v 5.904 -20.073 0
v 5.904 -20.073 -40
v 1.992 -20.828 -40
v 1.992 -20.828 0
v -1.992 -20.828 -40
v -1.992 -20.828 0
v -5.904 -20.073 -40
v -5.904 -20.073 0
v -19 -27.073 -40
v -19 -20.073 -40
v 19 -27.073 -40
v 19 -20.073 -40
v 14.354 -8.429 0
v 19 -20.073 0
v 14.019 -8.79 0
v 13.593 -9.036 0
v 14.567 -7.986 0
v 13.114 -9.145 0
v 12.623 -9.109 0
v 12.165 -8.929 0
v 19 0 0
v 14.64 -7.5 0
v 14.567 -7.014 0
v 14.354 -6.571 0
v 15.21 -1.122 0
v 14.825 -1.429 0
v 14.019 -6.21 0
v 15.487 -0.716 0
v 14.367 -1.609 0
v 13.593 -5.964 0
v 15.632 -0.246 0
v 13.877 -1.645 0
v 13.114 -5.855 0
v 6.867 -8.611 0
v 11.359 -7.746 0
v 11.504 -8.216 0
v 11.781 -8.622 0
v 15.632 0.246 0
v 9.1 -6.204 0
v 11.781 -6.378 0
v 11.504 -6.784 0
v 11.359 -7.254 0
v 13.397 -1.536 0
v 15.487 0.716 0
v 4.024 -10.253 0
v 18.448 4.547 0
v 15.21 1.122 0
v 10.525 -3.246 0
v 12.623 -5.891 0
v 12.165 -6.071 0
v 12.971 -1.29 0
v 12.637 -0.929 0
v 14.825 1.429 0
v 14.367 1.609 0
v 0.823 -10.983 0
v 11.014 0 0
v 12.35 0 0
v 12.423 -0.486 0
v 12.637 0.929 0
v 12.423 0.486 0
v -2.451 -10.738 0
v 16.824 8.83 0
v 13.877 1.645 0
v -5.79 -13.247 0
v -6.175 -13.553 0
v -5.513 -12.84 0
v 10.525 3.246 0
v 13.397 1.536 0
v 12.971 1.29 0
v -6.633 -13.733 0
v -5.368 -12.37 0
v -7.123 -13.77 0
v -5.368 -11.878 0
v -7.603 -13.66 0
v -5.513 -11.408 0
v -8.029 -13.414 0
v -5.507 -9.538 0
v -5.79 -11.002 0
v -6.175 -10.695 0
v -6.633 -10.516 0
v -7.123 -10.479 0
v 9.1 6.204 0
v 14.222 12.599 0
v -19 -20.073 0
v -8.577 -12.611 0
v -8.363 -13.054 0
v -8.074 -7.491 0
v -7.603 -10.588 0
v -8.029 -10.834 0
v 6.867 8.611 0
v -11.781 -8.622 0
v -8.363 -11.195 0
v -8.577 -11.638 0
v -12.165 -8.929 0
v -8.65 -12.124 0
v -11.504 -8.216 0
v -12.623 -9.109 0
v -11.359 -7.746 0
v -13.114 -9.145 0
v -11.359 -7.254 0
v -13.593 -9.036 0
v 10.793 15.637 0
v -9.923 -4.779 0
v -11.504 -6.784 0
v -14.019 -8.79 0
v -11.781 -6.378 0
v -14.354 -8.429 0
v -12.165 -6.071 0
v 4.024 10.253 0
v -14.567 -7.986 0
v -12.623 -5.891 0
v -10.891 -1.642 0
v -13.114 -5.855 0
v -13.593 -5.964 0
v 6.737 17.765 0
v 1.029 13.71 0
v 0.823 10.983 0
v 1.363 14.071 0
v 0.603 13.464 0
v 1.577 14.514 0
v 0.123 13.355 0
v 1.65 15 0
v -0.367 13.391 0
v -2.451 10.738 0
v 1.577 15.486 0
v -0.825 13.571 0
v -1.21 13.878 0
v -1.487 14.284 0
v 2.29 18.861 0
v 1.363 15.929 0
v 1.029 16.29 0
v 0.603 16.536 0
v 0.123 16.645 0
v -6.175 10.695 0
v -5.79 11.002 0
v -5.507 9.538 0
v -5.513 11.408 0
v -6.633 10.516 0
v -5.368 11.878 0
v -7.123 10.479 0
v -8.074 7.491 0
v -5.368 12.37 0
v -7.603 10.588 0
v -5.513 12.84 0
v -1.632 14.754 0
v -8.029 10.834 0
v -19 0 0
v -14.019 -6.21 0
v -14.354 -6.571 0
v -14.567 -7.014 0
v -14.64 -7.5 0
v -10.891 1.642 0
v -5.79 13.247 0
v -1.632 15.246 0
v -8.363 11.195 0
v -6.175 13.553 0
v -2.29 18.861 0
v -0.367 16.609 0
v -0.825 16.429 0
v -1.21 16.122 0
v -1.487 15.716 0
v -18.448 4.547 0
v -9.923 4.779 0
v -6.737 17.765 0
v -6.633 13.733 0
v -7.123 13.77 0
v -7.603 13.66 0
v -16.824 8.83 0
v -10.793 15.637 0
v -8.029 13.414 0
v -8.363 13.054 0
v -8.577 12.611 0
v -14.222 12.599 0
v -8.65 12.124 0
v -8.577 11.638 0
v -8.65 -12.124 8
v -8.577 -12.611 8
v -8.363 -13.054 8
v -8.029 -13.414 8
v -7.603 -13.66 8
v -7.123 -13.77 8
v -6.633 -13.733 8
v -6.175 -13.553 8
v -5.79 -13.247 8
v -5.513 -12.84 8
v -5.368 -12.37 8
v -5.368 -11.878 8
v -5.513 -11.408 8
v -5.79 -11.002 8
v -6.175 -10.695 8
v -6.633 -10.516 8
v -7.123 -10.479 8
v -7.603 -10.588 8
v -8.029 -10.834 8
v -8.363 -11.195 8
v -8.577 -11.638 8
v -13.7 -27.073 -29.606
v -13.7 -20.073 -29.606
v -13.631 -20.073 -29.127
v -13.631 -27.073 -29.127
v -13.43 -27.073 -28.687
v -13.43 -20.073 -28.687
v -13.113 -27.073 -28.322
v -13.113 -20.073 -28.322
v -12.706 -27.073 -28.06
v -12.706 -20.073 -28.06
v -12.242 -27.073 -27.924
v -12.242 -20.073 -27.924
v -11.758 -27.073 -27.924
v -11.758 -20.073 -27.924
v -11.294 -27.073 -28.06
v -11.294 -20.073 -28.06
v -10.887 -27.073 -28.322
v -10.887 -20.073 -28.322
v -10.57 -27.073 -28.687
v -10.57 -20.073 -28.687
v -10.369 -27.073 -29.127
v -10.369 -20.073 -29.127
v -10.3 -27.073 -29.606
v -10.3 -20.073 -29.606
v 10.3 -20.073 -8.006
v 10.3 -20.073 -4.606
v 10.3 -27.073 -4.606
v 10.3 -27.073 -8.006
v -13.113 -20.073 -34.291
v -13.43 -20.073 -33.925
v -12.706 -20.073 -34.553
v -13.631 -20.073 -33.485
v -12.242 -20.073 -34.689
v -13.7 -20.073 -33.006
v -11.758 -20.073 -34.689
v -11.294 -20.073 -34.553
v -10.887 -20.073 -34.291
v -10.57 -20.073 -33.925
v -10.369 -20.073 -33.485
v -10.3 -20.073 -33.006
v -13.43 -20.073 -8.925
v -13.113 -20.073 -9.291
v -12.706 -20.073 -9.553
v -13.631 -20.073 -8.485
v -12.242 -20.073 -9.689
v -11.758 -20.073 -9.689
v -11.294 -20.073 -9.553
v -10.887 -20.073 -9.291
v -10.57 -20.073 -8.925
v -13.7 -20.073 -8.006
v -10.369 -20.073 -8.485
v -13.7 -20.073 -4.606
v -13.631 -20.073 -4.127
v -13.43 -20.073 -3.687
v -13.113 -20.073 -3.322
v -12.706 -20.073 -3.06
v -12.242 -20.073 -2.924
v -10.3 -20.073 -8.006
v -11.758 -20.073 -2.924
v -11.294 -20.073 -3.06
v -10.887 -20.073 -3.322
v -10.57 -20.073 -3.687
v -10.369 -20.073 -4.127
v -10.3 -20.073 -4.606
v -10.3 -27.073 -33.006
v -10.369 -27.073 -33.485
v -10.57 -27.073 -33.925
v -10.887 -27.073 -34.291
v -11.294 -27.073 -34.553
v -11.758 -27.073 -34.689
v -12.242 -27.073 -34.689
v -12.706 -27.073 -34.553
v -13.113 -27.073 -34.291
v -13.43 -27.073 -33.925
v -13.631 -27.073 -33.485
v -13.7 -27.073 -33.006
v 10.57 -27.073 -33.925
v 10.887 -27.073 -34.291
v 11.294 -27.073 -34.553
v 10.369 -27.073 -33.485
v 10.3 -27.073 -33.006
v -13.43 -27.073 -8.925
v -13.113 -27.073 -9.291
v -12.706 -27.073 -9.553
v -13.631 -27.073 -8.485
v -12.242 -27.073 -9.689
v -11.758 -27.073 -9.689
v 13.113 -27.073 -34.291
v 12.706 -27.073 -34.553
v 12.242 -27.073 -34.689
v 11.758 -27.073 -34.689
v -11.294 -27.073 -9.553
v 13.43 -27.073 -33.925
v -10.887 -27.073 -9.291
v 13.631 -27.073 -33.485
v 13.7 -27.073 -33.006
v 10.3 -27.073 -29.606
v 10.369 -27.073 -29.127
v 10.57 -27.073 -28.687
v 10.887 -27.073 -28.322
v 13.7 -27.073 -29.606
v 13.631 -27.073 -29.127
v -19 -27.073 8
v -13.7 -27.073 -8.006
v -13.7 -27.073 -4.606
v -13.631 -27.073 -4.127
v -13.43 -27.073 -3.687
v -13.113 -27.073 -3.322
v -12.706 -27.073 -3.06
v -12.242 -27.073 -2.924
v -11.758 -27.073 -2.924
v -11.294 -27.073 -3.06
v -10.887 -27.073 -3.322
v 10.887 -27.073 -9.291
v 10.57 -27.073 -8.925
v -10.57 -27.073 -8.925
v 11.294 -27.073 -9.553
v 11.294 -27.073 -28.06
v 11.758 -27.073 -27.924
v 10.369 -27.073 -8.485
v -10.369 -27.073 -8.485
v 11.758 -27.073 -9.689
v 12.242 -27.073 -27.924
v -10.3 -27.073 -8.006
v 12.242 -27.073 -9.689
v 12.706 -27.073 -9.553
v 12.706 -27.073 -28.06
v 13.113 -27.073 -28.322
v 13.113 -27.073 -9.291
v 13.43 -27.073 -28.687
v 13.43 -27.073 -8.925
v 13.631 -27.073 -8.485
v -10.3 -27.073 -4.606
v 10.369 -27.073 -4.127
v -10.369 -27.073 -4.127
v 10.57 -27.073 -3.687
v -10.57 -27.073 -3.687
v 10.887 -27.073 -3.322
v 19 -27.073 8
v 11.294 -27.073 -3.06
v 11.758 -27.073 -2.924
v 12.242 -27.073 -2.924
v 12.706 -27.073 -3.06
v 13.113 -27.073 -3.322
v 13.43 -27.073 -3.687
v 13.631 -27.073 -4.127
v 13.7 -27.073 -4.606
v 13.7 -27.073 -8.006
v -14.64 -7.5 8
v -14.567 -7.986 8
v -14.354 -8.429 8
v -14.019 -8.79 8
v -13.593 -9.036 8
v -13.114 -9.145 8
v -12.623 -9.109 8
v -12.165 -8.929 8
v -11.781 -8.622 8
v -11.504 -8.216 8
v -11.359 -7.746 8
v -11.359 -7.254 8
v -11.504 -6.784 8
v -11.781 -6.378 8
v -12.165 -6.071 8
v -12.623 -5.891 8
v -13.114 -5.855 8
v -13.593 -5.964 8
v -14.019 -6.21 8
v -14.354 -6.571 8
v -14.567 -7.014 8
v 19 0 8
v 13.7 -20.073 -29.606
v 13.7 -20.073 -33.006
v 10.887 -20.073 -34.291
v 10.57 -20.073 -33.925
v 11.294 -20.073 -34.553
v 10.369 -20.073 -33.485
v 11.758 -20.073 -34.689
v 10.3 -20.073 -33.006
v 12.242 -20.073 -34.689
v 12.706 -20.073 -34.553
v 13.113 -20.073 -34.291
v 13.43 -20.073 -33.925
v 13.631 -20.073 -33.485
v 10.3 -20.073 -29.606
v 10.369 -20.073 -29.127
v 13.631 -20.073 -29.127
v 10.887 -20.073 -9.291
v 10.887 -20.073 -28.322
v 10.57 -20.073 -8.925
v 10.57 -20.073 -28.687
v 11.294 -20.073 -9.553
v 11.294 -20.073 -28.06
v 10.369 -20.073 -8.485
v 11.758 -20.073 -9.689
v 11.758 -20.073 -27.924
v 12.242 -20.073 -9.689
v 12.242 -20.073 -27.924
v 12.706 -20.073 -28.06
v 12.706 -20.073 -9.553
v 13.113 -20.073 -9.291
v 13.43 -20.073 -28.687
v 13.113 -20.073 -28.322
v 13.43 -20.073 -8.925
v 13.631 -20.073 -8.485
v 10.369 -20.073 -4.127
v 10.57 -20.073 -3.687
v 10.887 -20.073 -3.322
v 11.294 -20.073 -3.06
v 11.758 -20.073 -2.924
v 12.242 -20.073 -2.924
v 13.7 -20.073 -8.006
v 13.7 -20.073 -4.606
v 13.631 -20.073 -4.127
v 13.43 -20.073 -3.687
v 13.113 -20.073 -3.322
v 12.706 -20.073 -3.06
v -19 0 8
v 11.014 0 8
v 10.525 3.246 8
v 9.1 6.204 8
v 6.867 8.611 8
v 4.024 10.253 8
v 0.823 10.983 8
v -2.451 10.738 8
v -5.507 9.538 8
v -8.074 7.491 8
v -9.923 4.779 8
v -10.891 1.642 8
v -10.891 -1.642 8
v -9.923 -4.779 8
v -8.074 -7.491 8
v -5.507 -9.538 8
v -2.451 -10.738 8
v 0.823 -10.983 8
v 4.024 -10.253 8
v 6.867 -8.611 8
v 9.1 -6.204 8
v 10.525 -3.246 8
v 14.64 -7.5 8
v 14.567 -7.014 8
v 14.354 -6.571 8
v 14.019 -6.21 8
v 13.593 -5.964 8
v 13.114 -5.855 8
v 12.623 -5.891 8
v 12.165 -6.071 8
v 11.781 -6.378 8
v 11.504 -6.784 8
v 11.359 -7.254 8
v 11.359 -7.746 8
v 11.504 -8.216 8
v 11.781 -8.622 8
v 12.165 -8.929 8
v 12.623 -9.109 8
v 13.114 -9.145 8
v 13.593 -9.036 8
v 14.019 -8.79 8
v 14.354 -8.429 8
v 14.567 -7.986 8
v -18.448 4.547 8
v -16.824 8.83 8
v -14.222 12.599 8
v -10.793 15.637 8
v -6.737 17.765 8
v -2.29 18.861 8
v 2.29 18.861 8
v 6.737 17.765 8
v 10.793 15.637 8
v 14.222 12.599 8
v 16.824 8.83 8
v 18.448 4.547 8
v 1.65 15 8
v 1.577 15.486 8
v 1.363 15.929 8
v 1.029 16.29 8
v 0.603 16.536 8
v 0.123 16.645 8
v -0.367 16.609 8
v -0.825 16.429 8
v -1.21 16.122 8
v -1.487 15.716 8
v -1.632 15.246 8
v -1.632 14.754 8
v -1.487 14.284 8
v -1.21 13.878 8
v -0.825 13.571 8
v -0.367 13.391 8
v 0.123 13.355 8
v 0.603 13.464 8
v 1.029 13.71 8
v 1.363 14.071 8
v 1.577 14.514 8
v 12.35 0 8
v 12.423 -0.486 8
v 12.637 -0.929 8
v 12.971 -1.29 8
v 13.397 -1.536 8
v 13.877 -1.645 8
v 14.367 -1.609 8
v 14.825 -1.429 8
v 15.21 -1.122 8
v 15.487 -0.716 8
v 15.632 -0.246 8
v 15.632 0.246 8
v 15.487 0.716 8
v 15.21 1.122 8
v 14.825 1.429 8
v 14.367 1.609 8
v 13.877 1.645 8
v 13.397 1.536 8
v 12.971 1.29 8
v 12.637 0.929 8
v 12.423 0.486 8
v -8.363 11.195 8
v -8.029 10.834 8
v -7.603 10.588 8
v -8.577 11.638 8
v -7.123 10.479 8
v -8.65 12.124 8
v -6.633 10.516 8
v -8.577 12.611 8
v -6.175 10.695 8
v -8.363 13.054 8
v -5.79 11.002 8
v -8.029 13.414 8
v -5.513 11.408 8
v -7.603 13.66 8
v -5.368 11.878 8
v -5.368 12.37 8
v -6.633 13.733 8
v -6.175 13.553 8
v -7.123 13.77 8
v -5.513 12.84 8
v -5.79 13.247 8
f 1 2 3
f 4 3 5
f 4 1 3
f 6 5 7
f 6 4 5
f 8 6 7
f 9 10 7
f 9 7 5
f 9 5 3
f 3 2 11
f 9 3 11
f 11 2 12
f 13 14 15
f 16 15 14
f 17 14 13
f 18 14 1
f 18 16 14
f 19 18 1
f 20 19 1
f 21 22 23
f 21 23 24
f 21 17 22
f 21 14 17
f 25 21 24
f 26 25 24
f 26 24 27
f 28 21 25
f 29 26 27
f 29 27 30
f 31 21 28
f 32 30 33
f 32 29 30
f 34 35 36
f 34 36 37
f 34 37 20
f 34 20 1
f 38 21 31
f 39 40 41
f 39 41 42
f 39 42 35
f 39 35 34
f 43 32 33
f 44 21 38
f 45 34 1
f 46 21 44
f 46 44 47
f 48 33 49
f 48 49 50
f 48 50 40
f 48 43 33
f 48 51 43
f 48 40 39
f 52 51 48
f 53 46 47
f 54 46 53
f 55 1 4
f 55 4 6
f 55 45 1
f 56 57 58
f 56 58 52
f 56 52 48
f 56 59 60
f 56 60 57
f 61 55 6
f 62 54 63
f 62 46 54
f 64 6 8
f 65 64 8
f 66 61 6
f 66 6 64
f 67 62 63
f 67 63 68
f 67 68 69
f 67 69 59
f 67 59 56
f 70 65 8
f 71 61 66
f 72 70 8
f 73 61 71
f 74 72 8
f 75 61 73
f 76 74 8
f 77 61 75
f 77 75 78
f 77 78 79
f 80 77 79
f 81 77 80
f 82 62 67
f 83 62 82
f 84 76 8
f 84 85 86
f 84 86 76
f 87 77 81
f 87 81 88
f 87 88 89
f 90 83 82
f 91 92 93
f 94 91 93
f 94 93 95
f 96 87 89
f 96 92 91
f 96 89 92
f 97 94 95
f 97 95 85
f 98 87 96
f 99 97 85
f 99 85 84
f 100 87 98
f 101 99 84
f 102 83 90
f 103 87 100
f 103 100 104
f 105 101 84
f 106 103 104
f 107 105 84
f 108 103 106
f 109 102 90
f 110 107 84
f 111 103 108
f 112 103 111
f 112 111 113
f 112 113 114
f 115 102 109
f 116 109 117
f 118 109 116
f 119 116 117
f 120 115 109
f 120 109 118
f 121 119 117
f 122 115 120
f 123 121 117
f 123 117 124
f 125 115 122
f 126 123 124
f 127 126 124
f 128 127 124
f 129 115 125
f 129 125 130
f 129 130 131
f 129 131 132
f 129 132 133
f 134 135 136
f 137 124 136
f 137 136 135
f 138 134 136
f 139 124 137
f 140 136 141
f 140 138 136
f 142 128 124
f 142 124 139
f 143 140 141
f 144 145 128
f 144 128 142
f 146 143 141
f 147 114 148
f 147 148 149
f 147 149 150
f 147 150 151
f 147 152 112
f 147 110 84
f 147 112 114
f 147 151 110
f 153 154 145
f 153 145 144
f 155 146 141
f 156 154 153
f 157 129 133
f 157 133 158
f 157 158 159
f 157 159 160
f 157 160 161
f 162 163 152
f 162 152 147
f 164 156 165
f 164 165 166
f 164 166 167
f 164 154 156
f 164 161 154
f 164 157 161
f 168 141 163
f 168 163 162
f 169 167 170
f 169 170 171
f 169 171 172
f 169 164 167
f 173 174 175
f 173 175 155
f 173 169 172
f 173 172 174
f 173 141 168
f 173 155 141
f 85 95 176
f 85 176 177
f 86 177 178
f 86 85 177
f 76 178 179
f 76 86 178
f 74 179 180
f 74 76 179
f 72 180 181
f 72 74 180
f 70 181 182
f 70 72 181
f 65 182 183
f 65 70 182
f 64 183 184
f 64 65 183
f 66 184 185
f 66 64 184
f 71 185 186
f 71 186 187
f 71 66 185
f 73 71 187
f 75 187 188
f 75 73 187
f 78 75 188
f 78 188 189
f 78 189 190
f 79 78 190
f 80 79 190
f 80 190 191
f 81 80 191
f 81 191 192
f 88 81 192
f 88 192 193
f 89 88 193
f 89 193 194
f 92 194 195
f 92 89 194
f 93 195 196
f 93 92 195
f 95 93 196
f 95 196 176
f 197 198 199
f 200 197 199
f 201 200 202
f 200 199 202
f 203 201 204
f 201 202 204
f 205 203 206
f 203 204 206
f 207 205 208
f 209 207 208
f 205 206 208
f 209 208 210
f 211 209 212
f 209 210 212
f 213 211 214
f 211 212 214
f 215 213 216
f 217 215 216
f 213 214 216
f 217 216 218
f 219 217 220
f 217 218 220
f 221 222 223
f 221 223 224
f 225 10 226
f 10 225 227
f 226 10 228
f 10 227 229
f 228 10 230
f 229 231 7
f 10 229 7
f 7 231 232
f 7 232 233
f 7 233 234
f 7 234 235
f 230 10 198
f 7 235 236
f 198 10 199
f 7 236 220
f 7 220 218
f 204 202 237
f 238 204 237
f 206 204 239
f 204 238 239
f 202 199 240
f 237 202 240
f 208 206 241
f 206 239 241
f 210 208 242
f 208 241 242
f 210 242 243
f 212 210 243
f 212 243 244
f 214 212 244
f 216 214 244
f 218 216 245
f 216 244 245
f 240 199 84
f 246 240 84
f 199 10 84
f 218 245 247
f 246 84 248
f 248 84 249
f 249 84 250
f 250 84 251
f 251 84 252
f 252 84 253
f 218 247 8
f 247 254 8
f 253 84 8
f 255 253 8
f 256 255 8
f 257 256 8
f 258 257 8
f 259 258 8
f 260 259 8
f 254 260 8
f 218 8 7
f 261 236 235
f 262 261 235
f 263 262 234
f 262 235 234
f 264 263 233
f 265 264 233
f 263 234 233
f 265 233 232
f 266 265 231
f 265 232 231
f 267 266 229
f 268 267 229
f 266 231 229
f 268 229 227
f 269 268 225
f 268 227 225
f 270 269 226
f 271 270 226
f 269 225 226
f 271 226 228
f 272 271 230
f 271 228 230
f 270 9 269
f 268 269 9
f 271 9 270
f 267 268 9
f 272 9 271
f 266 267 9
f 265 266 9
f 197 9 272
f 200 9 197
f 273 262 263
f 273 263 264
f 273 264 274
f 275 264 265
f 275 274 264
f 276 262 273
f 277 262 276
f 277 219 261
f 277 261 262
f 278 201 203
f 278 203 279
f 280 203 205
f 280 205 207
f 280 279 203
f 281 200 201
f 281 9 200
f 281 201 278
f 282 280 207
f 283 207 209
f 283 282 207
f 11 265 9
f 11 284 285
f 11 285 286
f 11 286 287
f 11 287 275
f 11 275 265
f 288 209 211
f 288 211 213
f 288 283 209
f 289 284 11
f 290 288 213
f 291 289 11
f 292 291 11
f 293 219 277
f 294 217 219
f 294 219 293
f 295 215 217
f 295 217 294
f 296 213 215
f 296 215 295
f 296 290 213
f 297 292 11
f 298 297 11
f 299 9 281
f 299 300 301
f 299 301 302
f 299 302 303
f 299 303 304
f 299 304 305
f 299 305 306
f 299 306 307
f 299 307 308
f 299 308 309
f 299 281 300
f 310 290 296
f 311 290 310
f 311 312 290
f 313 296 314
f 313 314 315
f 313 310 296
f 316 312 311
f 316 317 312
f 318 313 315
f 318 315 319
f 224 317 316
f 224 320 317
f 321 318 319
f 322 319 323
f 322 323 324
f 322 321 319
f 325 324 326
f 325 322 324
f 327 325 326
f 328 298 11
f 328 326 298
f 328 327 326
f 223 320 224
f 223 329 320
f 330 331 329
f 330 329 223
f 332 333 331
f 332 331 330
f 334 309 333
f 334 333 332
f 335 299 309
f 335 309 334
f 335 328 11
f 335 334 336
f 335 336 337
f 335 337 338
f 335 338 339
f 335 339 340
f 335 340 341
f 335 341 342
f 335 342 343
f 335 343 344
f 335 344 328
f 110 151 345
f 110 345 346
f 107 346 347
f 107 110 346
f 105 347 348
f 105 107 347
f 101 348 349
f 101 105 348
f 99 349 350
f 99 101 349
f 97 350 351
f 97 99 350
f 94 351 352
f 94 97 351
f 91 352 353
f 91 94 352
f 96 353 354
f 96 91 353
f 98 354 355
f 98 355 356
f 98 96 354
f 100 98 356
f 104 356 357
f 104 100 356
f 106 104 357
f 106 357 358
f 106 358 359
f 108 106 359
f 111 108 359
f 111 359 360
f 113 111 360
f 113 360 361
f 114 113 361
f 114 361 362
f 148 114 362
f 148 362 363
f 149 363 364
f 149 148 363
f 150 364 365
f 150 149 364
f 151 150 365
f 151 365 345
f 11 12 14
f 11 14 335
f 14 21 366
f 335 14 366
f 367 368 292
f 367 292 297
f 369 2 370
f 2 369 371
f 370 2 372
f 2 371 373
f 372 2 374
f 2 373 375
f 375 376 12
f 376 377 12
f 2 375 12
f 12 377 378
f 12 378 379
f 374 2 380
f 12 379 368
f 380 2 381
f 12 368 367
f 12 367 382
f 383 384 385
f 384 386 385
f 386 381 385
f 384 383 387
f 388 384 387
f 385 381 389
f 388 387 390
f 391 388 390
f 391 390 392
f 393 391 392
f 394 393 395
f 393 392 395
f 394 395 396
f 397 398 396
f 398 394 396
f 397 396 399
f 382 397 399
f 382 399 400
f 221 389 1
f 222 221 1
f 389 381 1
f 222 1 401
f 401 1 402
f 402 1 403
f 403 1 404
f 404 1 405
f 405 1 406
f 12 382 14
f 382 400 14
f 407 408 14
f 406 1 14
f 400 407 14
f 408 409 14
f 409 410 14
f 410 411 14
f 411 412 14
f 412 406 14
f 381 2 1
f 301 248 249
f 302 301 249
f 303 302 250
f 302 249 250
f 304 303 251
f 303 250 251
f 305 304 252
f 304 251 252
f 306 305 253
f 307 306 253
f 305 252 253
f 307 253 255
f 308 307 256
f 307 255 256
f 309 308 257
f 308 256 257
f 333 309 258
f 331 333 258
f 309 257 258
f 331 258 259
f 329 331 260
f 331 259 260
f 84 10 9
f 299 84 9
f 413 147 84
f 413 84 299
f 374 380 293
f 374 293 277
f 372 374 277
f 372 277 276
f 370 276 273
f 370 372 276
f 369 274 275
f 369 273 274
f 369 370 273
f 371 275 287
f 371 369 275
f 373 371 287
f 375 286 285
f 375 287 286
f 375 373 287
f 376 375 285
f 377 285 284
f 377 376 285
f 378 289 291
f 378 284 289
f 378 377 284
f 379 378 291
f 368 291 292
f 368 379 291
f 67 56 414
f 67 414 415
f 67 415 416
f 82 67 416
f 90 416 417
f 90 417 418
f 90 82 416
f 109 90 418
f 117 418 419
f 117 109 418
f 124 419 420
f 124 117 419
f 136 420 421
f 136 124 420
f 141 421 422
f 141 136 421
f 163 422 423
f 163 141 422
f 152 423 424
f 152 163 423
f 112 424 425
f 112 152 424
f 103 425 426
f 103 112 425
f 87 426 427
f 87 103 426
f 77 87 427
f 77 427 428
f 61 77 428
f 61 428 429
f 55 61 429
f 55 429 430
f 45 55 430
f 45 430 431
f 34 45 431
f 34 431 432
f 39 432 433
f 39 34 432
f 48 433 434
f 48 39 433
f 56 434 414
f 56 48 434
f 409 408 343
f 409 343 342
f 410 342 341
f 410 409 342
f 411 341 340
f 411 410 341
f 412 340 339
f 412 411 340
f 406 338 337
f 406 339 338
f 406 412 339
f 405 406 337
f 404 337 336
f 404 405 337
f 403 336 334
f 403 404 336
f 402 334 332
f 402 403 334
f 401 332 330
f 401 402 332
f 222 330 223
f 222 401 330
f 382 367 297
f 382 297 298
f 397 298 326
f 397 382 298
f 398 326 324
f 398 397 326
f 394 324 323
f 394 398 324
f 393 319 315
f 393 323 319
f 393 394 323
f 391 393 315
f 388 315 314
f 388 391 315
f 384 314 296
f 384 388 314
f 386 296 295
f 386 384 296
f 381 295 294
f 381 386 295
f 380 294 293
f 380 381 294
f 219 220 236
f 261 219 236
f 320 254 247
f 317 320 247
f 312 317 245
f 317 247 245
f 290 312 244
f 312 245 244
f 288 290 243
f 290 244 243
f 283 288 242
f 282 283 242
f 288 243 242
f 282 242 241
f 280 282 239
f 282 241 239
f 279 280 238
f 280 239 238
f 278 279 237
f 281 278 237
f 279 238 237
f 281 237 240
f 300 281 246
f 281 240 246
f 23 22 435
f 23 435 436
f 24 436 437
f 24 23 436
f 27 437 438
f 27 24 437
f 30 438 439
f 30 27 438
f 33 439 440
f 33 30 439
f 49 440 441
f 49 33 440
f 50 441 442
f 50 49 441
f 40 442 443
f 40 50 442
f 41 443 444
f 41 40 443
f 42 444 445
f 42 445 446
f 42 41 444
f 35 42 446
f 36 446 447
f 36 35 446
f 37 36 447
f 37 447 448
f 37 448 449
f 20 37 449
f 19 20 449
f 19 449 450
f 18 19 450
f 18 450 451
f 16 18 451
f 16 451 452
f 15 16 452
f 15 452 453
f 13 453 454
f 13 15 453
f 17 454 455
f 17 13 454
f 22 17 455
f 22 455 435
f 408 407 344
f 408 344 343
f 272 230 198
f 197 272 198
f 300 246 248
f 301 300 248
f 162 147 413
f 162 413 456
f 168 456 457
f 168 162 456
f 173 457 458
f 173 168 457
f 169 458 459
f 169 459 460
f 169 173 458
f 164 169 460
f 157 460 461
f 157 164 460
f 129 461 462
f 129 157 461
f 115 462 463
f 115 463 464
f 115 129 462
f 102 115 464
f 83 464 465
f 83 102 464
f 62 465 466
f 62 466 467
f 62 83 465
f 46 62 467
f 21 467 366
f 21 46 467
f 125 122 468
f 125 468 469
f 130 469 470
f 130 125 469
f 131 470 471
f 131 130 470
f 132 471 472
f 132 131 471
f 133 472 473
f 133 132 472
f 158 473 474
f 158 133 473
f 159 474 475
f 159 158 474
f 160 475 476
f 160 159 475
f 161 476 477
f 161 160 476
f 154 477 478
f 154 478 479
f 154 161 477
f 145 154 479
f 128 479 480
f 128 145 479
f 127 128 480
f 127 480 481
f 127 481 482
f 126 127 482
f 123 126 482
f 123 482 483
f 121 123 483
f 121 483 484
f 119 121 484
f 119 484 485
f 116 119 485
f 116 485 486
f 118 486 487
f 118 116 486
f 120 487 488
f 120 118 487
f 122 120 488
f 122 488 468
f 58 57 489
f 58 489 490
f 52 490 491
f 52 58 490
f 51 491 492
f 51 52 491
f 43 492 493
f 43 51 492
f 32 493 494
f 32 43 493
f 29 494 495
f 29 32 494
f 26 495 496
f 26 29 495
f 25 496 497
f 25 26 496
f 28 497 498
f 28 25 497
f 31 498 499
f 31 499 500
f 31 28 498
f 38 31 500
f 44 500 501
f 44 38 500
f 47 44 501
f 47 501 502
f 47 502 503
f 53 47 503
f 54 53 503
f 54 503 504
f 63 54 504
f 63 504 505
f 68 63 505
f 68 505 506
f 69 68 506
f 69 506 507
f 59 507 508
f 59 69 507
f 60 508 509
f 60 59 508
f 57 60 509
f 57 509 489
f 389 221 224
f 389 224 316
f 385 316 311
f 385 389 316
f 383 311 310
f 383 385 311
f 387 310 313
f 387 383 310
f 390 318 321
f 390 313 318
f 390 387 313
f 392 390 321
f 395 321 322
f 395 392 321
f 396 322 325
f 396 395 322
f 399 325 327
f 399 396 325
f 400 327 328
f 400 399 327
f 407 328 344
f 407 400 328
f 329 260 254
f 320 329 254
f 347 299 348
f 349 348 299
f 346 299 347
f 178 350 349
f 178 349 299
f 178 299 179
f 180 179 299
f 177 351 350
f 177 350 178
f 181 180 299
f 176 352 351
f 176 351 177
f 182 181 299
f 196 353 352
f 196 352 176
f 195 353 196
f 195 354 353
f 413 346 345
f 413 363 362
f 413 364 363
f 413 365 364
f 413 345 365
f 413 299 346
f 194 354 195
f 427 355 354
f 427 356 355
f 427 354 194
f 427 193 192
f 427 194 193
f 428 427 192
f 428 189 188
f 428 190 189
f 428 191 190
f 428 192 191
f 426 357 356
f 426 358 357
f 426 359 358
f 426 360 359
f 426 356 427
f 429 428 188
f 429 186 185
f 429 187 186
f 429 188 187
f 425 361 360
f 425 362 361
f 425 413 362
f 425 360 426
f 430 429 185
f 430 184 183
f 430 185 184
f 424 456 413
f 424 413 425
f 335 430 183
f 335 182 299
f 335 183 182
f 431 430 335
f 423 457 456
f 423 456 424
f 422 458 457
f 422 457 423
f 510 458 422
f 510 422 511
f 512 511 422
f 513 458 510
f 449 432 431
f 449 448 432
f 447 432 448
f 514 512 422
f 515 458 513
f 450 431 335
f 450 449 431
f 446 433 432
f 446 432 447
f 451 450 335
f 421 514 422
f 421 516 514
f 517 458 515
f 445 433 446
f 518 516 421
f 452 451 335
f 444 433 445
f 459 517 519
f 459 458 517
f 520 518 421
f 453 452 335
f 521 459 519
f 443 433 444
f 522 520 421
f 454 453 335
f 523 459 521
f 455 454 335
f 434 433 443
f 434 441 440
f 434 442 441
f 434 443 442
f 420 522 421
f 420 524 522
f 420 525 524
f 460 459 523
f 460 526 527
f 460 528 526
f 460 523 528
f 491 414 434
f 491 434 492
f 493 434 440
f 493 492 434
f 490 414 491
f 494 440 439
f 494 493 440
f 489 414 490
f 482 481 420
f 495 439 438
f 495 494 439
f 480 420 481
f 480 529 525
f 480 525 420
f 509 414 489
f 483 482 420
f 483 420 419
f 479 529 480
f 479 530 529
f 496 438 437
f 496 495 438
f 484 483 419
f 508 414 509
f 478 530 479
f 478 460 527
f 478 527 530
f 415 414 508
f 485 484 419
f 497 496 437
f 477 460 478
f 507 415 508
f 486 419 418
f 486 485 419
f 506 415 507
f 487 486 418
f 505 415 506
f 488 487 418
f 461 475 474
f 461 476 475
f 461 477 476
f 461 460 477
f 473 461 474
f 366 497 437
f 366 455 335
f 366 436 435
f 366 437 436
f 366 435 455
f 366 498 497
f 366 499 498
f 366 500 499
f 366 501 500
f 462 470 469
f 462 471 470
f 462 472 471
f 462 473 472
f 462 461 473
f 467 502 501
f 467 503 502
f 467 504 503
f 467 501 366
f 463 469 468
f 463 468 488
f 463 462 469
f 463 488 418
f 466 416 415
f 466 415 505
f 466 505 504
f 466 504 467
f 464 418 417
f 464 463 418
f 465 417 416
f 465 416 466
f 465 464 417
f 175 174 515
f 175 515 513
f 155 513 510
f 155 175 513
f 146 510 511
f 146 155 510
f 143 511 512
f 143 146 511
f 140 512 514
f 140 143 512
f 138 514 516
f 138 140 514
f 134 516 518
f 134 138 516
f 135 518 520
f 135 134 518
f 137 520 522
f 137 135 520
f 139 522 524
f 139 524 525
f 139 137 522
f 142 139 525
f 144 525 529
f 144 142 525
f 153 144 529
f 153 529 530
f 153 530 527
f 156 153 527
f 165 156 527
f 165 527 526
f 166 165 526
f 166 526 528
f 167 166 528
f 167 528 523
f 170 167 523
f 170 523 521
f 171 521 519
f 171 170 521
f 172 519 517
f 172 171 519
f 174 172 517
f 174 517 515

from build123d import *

# Parameters (mm, degrees)
SKETCH1_R                = 11.013886191
BOSS_EXTRUDE1_DEPTH      = 8
BOSS_EXTRUDE2_DEPTH      = 5
BOSS_EXTRUDE2_DEPTH_BACK = 2
SKETCH2_W                = 38
SKETCH2_H                = 48
CUT_EXTRUDE1_DEPTH       = 51
CUT_EXTRUDE2_DEPTH       = 51


with BuildPart() as part:
    # Sketch1 → Boss-Extrude1 (new body)
    with BuildSketch(Plane.XY):
        with BuildLine():
            Line((0, -22.07294906), (-19, -22.07294906))
            Line((-19, -22.07294906), (-19, 0))
            ThreePointArc((-19, 0), (0, 19), (19, 0))
            Line((19, 0), (19, -22.07294906))
            Line((19, -22.07294906), (0, -22.07294906))
        make_face()
        Circle(SKETCH1_R, mode=Mode.SUBTRACT)
        with BuildLine():
            ThreePointArc((-11.340381057, -7.5), (-12.990381057, -5.85), (-14.640381057, -7.5))
            ThreePointArc((-14.640381057, -7.5), (-12.990381057, -9.15), (-11.340381057, -7.5))
        make_face(mode=Mode.SUBTRACT)
        with BuildLine():
            ThreePointArc((-5.35, -12.124355653), (-7, -10.474355653), (-8.65, -12.124355653))
            ThreePointArc((-8.65, -12.124355653), (-7, -13.774355653), (-5.35, -12.124355653))
        make_face(mode=Mode.SUBTRACT)
        with BuildLine():
            ThreePointArc((11.340381057, -7.5), (12.990381057, -9.15), (14.640381057, -7.5))
            ThreePointArc((14.640381057, -7.5), (12.990381057, -5.85), (11.340381057, -7.5))
        make_face(mode=Mode.SUBTRACT)
        with BuildLine():
            ThreePointArc((15.65, 0), (14, 1.65), (12.35, 0))
            ThreePointArc((12.35, 0), (14, -1.65), (15.65, 0))
        make_face(mode=Mode.SUBTRACT)
        with BuildLine():
            ThreePointArc((-1.65, 15), (0, 13.35), (1.65, 15))
            ThreePointArc((1.65, 15), (0, 16.65), (-1.65, 15))
        make_face(mode=Mode.SUBTRACT)
        with BuildLine():
            ThreePointArc((-5.35, 12.124355653), (-7, 13.774355653), (-8.65, 12.124355653))
            ThreePointArc((-8.65, 12.124355653), (-7, 10.474355653), (-5.35, 12.124355653))
        make_face(mode=Mode.SUBTRACT)
    extrude(amount=BOSS_EXTRUDE1_DEPTH)

    # Sketch2 → Boss-Extrude2 (add, two sides: drawn at the far end of the back side and taken through both)
    with BuildSketch(Plane.XZ.offset(22.07294906).offset(-BOSS_EXTRUDE2_DEPTH_BACK)):
        with Locations((0, -16)):
            Rectangle(SKETCH2_W, SKETCH2_H)
    extrude(amount=BOSS_EXTRUDE2_DEPTH + BOSS_EXTRUDE2_DEPTH_BACK)

    # Sketch3 → Cut-Extrude1 (cut)
    with BuildSketch(Plane(origin=(0, 0, 0), x_dir=(-1, 0, 0), z_dir=(0, 0, -1))):
        with BuildLine():
            Line((5.904398983, -20.07294906), (-5.904398983, -20.07294906))
            ThreePointArc((-5.904398983, -20.07294906), (0, -20.923317407), (5.904398983, -20.07294906))
        make_face()
    extrude(amount=CUT_EXTRUDE1_DEPTH, mode=Mode.SUBTRACT)

    # Sketch4 → Cut-Extrude2 (cut)
    with BuildSketch(Plane(origin=(0, -20.07294906, 0), x_dir=(1, 0, 0), z_dir=(0, 1, 0))):
        with BuildLine():
            Line((-13.7, 8.006381215), (-13.7, 4.606381215))
            ThreePointArc((-13.7, 4.606381215), (-12, 2.906381215), (-10.3, 4.606381215))
            Line((-10.3, 4.606381215), (-10.3, 8.006381215))
            ThreePointArc((-10.3, 8.006381215), (-12, 9.706381215), (-13.7, 8.006381215))
        make_face()
        with BuildLine():
            Line((-13.7, 33.006381215), (-13.7, 29.606381215))
            ThreePointArc((-13.7, 29.606381215), (-12, 27.906381215), (-10.3, 29.606381215))
            Line((-10.3, 29.606381215), (-10.3, 33.006381215))
            ThreePointArc((-10.3, 33.006381215), (-12, 34.706381215), (-13.7, 33.006381215))
        make_face()
        with BuildLine():
            Line((13.7, 33.006381215), (13.7, 29.606381215))
            ThreePointArc((13.7, 29.606381215), (12, 27.906381215), (10.3, 29.606381215))
            Line((10.3, 29.606381215), (10.3, 33.006381215))
            ThreePointArc((10.3, 33.006381215), (12, 34.706381215), (13.7, 33.006381215))
        make_face()
        with BuildLine():
            Line((13.7, 8.006381215), (13.7, 4.606381215))
            ThreePointArc((13.7, 4.606381215), (12, 2.906381215), (10.3, 4.606381215))
            Line((10.3, 4.606381215), (10.3, 8.006381215))
            ThreePointArc((10.3, 8.006381215), (12, 9.706381215), (13.7, 8.006381215))
        make_face()
    extrude(amount=-CUT_EXTRUDE2_DEPTH, mode=Mode.SUBTRACT)


solid = part.part
